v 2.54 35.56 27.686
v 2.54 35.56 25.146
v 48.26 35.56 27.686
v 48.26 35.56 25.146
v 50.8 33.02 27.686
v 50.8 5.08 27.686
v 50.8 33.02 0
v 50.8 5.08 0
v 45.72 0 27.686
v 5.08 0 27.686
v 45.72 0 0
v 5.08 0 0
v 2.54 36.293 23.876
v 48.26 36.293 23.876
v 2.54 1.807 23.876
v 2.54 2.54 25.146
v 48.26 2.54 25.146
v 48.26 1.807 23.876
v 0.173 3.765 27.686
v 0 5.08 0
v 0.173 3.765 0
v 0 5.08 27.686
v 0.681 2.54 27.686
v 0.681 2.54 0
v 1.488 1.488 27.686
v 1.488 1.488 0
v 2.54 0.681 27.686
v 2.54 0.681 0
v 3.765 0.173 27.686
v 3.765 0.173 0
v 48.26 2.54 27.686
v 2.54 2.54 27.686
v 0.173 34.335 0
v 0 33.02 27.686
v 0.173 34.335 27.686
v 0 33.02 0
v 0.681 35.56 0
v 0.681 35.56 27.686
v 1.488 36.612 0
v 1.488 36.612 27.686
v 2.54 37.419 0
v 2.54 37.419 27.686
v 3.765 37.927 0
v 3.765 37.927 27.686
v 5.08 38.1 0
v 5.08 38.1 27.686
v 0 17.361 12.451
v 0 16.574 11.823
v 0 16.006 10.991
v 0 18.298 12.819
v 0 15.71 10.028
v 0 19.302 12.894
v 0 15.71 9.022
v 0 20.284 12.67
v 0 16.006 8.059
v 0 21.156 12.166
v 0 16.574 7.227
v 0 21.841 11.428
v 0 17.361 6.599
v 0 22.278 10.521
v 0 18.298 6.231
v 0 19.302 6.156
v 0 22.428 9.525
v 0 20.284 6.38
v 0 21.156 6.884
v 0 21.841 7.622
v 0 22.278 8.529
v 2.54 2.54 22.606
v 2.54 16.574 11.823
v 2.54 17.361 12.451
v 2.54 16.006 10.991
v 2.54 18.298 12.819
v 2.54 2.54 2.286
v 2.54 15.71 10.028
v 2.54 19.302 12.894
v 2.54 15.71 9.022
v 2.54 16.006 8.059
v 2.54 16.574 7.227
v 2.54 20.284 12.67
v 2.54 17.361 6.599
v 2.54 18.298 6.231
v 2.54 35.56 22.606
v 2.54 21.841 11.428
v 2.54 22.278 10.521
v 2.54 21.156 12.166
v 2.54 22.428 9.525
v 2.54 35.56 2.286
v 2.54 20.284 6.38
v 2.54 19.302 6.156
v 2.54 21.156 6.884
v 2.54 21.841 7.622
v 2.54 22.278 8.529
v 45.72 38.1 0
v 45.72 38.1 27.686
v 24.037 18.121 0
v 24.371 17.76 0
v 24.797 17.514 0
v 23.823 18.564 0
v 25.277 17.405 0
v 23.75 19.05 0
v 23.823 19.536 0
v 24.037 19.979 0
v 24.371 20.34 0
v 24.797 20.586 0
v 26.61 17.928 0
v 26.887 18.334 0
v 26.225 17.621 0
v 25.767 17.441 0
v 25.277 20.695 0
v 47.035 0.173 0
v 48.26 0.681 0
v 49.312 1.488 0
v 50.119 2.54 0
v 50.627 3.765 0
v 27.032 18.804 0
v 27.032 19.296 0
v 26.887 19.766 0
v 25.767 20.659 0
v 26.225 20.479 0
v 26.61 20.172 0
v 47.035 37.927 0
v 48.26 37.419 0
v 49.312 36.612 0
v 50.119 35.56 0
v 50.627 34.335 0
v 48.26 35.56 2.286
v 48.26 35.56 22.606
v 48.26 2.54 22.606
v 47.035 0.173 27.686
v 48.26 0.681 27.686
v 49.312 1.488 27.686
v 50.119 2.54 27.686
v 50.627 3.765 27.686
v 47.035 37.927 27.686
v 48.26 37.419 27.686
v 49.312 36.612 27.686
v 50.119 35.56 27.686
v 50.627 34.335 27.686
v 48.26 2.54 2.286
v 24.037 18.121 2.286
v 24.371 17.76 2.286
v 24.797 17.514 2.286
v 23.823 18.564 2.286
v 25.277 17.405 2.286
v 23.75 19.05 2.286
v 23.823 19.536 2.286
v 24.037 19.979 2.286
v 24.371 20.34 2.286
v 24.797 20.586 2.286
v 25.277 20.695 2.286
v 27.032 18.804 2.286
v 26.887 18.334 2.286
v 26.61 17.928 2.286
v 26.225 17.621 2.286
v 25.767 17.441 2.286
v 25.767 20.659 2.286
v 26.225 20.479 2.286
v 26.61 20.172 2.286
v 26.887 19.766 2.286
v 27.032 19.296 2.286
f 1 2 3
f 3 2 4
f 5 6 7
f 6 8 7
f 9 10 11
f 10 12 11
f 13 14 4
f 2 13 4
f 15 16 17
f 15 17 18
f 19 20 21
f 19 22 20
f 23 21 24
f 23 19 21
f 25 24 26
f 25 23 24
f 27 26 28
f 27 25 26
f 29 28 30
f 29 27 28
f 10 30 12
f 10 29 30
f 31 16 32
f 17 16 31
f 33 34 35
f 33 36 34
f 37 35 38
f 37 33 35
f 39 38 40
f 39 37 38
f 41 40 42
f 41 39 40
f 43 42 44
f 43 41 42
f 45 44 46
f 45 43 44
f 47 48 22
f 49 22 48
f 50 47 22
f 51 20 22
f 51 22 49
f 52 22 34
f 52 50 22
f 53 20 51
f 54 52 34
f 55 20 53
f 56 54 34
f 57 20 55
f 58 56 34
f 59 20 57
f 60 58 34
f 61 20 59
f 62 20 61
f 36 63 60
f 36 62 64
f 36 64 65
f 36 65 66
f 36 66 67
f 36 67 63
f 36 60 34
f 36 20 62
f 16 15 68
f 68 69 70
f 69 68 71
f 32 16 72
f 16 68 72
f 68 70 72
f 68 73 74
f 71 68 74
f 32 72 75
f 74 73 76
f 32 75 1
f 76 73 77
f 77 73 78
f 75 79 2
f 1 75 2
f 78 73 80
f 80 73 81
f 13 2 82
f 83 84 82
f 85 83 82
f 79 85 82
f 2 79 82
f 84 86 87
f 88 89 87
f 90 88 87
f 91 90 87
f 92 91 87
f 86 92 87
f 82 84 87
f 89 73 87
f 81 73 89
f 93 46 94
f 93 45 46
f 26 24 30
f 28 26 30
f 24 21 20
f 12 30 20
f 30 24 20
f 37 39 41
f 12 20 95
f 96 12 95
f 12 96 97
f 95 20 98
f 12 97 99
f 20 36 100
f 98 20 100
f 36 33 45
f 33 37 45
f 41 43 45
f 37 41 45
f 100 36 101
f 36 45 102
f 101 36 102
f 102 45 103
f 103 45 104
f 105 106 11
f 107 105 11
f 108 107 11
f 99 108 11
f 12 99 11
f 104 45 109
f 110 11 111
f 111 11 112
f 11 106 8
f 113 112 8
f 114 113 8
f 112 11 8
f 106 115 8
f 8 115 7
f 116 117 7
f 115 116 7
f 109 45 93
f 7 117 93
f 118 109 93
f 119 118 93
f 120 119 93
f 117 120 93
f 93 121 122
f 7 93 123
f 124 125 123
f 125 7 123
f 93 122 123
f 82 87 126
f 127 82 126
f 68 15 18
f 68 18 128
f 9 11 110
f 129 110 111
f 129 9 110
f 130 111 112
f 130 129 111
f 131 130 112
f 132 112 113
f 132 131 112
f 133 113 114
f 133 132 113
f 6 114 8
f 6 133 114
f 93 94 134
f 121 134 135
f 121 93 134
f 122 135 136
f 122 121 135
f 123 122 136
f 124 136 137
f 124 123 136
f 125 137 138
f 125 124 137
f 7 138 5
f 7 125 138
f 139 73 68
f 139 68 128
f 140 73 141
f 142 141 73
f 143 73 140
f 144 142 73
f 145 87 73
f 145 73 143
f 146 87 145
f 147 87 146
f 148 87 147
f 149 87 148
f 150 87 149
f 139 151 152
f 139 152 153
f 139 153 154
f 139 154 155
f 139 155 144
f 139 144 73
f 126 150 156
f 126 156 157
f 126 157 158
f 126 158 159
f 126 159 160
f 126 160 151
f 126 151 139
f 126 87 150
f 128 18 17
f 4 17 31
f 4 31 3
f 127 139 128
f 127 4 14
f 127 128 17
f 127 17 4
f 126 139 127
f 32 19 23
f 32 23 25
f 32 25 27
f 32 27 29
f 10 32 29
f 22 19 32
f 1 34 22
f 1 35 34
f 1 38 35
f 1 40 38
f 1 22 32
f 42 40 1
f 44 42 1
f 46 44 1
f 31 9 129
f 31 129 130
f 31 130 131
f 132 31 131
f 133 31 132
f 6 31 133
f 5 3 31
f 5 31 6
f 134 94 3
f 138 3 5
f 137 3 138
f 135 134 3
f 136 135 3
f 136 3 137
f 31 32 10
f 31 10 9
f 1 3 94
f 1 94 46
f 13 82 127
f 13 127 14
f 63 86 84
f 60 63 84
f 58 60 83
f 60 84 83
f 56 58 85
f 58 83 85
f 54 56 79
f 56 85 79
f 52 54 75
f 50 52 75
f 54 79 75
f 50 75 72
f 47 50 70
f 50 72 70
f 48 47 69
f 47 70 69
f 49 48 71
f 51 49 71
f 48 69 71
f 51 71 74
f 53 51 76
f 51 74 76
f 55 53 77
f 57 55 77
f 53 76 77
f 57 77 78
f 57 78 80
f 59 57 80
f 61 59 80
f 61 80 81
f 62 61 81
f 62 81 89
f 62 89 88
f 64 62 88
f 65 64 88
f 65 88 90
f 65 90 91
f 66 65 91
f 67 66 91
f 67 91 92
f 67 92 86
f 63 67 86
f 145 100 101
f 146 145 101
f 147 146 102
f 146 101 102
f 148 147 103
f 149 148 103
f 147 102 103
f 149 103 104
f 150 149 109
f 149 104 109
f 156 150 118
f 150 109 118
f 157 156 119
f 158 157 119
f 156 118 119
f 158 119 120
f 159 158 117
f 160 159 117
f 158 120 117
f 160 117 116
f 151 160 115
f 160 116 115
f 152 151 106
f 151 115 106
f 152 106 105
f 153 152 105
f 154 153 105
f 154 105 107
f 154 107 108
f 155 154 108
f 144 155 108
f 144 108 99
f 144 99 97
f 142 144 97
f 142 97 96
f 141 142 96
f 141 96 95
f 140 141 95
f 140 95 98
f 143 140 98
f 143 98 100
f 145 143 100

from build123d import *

# Parameters (mm, degrees)
F0_W          = 50.8
F0_H          = 38.1
F1_DEPTH      = 2.286
F2_W          = 50.8
F2_H          = 38.1
F2_W_2        = 45.72
F2_H_2        = 33.02
F3_DEPTH      = 25.4
F6_DEPTH      = 12.7
F6_DEPTH_BACK = 33.02
F8_D          = 3.3
F10_D         = 6.7564
F10_DEPTH     = 38.1
F10_TIP       = 2.0298273432
F11_R         = 5.08


with BuildPart() as f1:
    # F0 (on Top) → F1 (new body)
    with BuildSketch(Plane.XY):
        with Locations((25.4, 19.05)):
            Rectangle(F0_W, F0_H)
    extrude(amount=F1_DEPTH)

    # F2 (on face) → F3 (join)
    with BuildSketch(Plane.XY.offset(2.286)):
        with Locations((25.4, 19.05)):
            Rectangle(F2_W, F2_H)
        with Locations((25.4, 19.05)):
            Rectangle(F2_W_2, F2_H_2, mode=Mode.SUBTRACT)
    extrude(amount=F3_DEPTH)

    # F5 (on offset) → F6 (cut, two sides)
    with BuildSketch(Plane.YZ.offset(15.24)) as f6_sk:
        Polygon((2.54, 22.606), (2.54, 25.146), (1.8067651581, 23.876), align=None)
        Polygon((36.2932348419, 23.876), (35.56, 25.146), (35.56, 22.606), align=None)
    extrude(amount=-F6_DEPTH, mode=Mode.SUBTRACT)
    extrude(f6_sk.sketch, amount=F6_DEPTH_BACK, mode=Mode.SUBTRACT)

    # F8 (through all)
    with Locations(Plane.XY.offset(2.286)):
        with Locations((25.4, 19.05)):
            Hole(F8_D / 2)

    # F10
    with Locations(Plane(origin=(0, 0, 0), x_dir=(0, -1, 0), z_dir=(-1, 0, 0))):
        with Locations((-19.05, 9.525)):
            Hole(F10_D / 2, depth=F10_DEPTH)
            with Locations((0, 0, -(F10_DEPTH + F10_TIP / 2))):  # 118° drill point
                Cone(0, F10_D / 2, F10_TIP, mode=Mode.SUBTRACT)

    # F11
    f11_edges = [f1.edges().sort_by_distance(p)[0] for p in [
        (0, 0, 13.843),
        (50.8, 0, 13.843),
        (50.8, 38.1, 13.843),
        (0, 38.1, 13.843),
    ]]
    fillet(f11_edges, radius=F11_R)


solid = f1.part
